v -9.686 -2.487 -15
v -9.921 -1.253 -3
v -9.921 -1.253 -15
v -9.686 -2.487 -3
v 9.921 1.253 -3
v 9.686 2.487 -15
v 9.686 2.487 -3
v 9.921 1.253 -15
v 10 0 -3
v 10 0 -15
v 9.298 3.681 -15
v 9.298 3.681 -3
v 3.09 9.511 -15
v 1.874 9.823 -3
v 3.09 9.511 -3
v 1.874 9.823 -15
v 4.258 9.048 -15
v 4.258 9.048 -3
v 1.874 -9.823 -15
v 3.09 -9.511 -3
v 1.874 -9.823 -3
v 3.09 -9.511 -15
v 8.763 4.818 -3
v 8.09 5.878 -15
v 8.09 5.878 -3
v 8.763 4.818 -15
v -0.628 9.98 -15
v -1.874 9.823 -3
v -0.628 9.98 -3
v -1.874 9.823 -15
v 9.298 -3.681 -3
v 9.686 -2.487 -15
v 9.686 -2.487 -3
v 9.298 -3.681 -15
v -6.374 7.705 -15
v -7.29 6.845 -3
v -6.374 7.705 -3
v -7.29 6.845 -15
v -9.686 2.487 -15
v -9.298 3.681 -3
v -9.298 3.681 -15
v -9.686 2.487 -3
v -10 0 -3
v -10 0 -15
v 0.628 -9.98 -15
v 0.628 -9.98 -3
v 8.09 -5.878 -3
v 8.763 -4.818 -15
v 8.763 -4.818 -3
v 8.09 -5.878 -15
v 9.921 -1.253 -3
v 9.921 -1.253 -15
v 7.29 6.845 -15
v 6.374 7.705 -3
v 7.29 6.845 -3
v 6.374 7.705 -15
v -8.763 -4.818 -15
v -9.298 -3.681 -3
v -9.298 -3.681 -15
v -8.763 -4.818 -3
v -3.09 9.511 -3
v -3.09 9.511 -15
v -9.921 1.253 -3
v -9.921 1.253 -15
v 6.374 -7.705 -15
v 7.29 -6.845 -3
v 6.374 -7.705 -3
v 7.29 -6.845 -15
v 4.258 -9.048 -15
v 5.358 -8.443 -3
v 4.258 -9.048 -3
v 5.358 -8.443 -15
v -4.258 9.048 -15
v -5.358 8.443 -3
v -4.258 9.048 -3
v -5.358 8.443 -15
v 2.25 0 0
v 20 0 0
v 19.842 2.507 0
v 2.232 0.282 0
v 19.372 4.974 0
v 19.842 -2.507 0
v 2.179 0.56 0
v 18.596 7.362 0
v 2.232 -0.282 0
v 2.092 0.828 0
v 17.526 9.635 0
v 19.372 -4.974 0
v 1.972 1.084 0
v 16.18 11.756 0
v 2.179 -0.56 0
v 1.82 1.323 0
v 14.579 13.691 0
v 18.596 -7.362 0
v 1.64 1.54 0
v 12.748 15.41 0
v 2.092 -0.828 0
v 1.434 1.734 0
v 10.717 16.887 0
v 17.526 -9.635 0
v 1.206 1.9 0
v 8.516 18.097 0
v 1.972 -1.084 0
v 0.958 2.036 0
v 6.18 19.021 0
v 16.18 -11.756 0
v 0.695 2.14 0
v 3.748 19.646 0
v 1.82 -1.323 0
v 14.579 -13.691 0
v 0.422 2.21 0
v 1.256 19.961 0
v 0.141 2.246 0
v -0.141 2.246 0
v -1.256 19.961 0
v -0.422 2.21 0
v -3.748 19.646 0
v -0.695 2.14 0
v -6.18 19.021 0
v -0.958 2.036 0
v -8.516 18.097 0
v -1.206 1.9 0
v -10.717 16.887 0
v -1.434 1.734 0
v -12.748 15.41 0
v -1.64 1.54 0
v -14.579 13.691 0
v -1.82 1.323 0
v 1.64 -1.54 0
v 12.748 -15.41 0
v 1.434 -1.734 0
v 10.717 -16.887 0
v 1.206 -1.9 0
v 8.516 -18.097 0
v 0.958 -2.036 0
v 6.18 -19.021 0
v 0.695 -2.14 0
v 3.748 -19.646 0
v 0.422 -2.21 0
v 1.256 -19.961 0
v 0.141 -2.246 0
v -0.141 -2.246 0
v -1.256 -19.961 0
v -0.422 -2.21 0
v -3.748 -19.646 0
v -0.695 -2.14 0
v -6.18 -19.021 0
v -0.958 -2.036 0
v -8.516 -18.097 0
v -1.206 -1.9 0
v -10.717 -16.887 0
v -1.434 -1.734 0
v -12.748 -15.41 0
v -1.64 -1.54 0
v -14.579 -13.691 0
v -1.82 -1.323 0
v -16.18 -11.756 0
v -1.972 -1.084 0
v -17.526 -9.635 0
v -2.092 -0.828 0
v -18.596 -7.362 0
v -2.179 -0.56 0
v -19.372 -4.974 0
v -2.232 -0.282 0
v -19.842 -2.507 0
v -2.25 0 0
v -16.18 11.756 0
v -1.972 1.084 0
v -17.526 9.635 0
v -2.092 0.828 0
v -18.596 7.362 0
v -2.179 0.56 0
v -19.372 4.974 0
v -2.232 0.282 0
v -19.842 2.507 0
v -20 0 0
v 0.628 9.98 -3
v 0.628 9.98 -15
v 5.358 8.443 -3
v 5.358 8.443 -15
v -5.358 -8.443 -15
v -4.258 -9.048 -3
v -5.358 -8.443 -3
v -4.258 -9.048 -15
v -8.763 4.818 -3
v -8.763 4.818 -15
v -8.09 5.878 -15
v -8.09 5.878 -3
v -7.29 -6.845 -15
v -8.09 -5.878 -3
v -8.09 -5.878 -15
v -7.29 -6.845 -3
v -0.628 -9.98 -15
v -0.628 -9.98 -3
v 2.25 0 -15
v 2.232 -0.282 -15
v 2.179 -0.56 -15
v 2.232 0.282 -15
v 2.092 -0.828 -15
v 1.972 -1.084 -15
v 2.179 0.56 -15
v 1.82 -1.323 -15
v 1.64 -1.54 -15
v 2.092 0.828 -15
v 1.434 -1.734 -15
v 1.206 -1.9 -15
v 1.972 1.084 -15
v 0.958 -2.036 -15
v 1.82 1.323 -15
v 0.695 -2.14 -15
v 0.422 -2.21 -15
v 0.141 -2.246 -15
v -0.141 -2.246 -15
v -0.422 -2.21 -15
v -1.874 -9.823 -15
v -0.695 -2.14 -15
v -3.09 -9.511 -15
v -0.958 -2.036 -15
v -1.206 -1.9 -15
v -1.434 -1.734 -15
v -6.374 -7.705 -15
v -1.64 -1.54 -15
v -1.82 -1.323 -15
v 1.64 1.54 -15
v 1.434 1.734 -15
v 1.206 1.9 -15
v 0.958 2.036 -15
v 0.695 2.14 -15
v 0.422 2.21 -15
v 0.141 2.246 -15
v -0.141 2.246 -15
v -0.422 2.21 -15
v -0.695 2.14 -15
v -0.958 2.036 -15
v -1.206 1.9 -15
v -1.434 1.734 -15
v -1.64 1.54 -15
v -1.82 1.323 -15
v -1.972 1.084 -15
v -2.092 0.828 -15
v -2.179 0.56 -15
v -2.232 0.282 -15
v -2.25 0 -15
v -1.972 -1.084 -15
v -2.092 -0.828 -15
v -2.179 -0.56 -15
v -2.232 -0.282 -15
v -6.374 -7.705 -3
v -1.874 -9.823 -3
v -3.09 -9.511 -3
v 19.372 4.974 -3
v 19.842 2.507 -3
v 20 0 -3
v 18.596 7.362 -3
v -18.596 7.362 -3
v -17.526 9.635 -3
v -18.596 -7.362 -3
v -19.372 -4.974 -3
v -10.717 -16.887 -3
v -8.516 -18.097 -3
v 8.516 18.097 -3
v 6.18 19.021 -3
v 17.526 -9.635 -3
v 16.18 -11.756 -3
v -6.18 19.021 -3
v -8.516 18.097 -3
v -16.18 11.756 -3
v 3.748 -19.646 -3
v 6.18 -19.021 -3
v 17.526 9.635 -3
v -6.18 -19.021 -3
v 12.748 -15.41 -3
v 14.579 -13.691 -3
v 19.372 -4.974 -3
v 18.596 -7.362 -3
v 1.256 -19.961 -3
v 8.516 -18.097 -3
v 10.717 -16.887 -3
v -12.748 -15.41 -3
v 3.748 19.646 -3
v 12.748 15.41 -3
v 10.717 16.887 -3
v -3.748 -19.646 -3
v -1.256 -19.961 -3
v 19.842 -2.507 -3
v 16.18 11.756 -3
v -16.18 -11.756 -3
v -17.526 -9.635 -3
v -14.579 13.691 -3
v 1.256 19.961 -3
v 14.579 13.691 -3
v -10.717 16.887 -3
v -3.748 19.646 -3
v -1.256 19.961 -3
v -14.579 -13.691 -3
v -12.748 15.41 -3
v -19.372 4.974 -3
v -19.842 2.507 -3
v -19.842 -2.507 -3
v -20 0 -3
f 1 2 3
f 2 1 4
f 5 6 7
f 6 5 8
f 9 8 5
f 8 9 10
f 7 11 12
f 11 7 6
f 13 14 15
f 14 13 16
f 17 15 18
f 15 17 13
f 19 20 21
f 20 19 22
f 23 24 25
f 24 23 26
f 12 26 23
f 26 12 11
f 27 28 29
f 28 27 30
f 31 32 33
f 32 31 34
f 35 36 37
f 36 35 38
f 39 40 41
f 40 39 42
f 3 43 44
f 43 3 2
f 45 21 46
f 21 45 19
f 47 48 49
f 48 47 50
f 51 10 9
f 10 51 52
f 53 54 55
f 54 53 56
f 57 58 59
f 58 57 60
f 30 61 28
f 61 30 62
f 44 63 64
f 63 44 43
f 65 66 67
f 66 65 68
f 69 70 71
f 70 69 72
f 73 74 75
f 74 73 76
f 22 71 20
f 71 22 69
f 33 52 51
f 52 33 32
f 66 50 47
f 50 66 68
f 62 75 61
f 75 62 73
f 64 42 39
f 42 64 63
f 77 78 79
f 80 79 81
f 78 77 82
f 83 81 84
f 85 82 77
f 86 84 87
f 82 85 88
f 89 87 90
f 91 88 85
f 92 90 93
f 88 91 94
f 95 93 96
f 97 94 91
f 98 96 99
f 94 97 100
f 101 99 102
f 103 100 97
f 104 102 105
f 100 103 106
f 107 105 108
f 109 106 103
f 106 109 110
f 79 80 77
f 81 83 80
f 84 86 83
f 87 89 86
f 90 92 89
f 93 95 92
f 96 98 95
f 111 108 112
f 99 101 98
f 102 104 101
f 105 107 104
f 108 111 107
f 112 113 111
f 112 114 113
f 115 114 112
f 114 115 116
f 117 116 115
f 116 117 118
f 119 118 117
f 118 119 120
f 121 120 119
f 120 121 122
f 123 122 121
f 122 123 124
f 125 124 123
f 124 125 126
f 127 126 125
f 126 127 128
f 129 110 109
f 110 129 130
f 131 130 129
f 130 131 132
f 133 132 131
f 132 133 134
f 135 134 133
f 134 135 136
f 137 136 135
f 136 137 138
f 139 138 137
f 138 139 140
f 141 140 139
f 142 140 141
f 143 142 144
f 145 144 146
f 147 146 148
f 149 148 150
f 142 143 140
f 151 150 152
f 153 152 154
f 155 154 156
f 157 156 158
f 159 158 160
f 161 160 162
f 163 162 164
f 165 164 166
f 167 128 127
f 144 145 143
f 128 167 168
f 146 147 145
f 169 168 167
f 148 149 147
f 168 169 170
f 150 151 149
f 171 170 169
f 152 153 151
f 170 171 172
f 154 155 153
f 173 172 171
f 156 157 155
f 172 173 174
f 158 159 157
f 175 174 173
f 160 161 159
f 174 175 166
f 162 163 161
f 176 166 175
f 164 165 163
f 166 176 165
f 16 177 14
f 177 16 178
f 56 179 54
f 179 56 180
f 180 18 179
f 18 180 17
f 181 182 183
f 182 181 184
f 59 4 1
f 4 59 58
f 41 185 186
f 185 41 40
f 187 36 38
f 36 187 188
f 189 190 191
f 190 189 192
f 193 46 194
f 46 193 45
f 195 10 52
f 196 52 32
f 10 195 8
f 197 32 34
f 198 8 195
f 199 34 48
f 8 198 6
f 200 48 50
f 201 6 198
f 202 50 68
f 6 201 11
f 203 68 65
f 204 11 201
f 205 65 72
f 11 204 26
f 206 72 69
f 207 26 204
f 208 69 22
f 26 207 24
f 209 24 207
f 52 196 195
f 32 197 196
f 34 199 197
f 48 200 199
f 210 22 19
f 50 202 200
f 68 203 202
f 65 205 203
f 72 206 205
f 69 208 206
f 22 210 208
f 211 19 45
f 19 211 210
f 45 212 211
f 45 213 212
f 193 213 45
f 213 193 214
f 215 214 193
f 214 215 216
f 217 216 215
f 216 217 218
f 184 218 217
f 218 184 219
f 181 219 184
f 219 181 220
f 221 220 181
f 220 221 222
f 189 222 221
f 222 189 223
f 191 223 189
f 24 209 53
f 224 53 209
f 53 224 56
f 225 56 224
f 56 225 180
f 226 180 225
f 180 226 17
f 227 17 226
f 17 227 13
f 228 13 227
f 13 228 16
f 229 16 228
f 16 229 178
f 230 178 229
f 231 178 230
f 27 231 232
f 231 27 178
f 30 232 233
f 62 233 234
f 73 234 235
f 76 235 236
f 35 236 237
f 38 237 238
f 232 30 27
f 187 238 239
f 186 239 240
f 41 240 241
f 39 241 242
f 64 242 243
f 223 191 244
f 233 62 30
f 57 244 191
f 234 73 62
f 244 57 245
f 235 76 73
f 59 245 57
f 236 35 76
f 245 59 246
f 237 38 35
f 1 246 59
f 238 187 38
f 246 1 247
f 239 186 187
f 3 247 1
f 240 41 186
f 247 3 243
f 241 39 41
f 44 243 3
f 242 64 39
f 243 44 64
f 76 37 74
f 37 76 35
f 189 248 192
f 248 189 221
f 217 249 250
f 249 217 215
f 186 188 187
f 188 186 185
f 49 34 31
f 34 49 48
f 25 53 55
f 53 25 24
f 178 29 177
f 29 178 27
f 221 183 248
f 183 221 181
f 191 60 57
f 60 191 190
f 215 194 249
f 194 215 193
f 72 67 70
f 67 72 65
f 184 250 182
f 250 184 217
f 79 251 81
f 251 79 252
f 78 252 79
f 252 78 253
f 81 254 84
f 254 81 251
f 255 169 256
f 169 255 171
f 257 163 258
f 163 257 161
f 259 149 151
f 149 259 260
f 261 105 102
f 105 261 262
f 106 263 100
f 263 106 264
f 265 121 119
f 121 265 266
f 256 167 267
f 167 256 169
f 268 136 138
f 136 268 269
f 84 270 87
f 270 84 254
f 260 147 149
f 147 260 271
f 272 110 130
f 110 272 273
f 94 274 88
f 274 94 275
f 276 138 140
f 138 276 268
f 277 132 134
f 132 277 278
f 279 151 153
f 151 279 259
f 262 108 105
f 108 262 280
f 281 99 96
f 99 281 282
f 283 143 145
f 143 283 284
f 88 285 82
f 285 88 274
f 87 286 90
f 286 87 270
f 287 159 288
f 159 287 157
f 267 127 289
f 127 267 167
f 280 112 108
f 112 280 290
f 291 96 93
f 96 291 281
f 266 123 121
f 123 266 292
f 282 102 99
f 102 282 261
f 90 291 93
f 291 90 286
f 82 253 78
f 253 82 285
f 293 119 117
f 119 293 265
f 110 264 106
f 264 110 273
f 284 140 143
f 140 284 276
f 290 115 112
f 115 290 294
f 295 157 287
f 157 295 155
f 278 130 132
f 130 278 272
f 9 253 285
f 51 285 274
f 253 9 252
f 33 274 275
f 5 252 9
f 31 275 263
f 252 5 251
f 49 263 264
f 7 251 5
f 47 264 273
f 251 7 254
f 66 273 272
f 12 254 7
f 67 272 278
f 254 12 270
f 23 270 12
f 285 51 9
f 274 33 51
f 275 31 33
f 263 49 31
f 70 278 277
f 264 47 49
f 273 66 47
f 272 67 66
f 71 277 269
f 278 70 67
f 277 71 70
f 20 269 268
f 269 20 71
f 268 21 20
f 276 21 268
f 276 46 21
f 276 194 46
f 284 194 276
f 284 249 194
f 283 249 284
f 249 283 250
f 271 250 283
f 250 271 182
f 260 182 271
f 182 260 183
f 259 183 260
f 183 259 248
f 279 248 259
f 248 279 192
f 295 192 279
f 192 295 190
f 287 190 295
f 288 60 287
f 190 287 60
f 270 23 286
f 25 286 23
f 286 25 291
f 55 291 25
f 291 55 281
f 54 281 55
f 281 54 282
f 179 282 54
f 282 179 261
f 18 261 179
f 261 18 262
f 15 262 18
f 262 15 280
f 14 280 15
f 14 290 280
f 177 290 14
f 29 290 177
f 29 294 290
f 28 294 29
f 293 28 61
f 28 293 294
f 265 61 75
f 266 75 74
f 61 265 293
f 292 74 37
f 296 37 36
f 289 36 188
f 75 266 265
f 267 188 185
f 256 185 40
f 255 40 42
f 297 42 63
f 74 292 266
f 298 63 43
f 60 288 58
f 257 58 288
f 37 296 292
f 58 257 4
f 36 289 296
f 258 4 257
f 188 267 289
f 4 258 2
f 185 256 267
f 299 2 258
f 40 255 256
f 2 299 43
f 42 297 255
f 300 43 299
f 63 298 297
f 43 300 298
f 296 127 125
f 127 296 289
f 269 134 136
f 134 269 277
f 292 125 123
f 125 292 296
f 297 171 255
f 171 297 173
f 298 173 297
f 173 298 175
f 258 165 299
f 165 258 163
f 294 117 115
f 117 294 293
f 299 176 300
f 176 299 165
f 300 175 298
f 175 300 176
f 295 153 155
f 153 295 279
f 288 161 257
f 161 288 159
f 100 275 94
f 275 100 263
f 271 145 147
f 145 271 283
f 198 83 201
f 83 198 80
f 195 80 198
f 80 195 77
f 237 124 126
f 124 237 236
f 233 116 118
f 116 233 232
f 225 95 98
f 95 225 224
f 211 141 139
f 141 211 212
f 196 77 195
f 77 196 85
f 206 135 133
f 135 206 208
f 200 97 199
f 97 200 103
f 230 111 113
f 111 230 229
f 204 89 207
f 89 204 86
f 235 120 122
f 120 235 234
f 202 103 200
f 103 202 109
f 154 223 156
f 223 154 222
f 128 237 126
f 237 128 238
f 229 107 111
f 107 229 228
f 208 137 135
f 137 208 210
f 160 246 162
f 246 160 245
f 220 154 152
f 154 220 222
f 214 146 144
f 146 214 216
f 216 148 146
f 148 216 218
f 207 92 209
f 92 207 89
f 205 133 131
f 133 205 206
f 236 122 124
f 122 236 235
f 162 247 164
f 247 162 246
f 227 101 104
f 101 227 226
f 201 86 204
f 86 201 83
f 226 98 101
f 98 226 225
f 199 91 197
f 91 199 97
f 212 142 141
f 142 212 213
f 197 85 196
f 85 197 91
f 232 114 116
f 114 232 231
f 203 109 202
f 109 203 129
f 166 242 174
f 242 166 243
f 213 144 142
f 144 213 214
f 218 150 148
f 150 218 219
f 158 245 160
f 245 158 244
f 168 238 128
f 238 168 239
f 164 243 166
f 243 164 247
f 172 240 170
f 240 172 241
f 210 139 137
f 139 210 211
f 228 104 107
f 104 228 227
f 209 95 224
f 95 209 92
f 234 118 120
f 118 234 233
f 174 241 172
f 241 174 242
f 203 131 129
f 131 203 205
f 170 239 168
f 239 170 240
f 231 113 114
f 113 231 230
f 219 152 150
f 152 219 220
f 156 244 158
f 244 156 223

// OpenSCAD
$fn = 50;


difference() {
	union() {
		translate(v = [0, 0, -15.0000000000]) {
			cylinder(h = 15, r = 10.0000000000);
		}
		translate(v = [0, 0, -3.0000000000]) {
			cylinder(h = 3, r = 20.0000000000);
		}
	}
	union() {
		#translate(v = [0, 0, -15]) {
			cylinder(h = 15, r = 2.2500000000);
		}
	}
}
